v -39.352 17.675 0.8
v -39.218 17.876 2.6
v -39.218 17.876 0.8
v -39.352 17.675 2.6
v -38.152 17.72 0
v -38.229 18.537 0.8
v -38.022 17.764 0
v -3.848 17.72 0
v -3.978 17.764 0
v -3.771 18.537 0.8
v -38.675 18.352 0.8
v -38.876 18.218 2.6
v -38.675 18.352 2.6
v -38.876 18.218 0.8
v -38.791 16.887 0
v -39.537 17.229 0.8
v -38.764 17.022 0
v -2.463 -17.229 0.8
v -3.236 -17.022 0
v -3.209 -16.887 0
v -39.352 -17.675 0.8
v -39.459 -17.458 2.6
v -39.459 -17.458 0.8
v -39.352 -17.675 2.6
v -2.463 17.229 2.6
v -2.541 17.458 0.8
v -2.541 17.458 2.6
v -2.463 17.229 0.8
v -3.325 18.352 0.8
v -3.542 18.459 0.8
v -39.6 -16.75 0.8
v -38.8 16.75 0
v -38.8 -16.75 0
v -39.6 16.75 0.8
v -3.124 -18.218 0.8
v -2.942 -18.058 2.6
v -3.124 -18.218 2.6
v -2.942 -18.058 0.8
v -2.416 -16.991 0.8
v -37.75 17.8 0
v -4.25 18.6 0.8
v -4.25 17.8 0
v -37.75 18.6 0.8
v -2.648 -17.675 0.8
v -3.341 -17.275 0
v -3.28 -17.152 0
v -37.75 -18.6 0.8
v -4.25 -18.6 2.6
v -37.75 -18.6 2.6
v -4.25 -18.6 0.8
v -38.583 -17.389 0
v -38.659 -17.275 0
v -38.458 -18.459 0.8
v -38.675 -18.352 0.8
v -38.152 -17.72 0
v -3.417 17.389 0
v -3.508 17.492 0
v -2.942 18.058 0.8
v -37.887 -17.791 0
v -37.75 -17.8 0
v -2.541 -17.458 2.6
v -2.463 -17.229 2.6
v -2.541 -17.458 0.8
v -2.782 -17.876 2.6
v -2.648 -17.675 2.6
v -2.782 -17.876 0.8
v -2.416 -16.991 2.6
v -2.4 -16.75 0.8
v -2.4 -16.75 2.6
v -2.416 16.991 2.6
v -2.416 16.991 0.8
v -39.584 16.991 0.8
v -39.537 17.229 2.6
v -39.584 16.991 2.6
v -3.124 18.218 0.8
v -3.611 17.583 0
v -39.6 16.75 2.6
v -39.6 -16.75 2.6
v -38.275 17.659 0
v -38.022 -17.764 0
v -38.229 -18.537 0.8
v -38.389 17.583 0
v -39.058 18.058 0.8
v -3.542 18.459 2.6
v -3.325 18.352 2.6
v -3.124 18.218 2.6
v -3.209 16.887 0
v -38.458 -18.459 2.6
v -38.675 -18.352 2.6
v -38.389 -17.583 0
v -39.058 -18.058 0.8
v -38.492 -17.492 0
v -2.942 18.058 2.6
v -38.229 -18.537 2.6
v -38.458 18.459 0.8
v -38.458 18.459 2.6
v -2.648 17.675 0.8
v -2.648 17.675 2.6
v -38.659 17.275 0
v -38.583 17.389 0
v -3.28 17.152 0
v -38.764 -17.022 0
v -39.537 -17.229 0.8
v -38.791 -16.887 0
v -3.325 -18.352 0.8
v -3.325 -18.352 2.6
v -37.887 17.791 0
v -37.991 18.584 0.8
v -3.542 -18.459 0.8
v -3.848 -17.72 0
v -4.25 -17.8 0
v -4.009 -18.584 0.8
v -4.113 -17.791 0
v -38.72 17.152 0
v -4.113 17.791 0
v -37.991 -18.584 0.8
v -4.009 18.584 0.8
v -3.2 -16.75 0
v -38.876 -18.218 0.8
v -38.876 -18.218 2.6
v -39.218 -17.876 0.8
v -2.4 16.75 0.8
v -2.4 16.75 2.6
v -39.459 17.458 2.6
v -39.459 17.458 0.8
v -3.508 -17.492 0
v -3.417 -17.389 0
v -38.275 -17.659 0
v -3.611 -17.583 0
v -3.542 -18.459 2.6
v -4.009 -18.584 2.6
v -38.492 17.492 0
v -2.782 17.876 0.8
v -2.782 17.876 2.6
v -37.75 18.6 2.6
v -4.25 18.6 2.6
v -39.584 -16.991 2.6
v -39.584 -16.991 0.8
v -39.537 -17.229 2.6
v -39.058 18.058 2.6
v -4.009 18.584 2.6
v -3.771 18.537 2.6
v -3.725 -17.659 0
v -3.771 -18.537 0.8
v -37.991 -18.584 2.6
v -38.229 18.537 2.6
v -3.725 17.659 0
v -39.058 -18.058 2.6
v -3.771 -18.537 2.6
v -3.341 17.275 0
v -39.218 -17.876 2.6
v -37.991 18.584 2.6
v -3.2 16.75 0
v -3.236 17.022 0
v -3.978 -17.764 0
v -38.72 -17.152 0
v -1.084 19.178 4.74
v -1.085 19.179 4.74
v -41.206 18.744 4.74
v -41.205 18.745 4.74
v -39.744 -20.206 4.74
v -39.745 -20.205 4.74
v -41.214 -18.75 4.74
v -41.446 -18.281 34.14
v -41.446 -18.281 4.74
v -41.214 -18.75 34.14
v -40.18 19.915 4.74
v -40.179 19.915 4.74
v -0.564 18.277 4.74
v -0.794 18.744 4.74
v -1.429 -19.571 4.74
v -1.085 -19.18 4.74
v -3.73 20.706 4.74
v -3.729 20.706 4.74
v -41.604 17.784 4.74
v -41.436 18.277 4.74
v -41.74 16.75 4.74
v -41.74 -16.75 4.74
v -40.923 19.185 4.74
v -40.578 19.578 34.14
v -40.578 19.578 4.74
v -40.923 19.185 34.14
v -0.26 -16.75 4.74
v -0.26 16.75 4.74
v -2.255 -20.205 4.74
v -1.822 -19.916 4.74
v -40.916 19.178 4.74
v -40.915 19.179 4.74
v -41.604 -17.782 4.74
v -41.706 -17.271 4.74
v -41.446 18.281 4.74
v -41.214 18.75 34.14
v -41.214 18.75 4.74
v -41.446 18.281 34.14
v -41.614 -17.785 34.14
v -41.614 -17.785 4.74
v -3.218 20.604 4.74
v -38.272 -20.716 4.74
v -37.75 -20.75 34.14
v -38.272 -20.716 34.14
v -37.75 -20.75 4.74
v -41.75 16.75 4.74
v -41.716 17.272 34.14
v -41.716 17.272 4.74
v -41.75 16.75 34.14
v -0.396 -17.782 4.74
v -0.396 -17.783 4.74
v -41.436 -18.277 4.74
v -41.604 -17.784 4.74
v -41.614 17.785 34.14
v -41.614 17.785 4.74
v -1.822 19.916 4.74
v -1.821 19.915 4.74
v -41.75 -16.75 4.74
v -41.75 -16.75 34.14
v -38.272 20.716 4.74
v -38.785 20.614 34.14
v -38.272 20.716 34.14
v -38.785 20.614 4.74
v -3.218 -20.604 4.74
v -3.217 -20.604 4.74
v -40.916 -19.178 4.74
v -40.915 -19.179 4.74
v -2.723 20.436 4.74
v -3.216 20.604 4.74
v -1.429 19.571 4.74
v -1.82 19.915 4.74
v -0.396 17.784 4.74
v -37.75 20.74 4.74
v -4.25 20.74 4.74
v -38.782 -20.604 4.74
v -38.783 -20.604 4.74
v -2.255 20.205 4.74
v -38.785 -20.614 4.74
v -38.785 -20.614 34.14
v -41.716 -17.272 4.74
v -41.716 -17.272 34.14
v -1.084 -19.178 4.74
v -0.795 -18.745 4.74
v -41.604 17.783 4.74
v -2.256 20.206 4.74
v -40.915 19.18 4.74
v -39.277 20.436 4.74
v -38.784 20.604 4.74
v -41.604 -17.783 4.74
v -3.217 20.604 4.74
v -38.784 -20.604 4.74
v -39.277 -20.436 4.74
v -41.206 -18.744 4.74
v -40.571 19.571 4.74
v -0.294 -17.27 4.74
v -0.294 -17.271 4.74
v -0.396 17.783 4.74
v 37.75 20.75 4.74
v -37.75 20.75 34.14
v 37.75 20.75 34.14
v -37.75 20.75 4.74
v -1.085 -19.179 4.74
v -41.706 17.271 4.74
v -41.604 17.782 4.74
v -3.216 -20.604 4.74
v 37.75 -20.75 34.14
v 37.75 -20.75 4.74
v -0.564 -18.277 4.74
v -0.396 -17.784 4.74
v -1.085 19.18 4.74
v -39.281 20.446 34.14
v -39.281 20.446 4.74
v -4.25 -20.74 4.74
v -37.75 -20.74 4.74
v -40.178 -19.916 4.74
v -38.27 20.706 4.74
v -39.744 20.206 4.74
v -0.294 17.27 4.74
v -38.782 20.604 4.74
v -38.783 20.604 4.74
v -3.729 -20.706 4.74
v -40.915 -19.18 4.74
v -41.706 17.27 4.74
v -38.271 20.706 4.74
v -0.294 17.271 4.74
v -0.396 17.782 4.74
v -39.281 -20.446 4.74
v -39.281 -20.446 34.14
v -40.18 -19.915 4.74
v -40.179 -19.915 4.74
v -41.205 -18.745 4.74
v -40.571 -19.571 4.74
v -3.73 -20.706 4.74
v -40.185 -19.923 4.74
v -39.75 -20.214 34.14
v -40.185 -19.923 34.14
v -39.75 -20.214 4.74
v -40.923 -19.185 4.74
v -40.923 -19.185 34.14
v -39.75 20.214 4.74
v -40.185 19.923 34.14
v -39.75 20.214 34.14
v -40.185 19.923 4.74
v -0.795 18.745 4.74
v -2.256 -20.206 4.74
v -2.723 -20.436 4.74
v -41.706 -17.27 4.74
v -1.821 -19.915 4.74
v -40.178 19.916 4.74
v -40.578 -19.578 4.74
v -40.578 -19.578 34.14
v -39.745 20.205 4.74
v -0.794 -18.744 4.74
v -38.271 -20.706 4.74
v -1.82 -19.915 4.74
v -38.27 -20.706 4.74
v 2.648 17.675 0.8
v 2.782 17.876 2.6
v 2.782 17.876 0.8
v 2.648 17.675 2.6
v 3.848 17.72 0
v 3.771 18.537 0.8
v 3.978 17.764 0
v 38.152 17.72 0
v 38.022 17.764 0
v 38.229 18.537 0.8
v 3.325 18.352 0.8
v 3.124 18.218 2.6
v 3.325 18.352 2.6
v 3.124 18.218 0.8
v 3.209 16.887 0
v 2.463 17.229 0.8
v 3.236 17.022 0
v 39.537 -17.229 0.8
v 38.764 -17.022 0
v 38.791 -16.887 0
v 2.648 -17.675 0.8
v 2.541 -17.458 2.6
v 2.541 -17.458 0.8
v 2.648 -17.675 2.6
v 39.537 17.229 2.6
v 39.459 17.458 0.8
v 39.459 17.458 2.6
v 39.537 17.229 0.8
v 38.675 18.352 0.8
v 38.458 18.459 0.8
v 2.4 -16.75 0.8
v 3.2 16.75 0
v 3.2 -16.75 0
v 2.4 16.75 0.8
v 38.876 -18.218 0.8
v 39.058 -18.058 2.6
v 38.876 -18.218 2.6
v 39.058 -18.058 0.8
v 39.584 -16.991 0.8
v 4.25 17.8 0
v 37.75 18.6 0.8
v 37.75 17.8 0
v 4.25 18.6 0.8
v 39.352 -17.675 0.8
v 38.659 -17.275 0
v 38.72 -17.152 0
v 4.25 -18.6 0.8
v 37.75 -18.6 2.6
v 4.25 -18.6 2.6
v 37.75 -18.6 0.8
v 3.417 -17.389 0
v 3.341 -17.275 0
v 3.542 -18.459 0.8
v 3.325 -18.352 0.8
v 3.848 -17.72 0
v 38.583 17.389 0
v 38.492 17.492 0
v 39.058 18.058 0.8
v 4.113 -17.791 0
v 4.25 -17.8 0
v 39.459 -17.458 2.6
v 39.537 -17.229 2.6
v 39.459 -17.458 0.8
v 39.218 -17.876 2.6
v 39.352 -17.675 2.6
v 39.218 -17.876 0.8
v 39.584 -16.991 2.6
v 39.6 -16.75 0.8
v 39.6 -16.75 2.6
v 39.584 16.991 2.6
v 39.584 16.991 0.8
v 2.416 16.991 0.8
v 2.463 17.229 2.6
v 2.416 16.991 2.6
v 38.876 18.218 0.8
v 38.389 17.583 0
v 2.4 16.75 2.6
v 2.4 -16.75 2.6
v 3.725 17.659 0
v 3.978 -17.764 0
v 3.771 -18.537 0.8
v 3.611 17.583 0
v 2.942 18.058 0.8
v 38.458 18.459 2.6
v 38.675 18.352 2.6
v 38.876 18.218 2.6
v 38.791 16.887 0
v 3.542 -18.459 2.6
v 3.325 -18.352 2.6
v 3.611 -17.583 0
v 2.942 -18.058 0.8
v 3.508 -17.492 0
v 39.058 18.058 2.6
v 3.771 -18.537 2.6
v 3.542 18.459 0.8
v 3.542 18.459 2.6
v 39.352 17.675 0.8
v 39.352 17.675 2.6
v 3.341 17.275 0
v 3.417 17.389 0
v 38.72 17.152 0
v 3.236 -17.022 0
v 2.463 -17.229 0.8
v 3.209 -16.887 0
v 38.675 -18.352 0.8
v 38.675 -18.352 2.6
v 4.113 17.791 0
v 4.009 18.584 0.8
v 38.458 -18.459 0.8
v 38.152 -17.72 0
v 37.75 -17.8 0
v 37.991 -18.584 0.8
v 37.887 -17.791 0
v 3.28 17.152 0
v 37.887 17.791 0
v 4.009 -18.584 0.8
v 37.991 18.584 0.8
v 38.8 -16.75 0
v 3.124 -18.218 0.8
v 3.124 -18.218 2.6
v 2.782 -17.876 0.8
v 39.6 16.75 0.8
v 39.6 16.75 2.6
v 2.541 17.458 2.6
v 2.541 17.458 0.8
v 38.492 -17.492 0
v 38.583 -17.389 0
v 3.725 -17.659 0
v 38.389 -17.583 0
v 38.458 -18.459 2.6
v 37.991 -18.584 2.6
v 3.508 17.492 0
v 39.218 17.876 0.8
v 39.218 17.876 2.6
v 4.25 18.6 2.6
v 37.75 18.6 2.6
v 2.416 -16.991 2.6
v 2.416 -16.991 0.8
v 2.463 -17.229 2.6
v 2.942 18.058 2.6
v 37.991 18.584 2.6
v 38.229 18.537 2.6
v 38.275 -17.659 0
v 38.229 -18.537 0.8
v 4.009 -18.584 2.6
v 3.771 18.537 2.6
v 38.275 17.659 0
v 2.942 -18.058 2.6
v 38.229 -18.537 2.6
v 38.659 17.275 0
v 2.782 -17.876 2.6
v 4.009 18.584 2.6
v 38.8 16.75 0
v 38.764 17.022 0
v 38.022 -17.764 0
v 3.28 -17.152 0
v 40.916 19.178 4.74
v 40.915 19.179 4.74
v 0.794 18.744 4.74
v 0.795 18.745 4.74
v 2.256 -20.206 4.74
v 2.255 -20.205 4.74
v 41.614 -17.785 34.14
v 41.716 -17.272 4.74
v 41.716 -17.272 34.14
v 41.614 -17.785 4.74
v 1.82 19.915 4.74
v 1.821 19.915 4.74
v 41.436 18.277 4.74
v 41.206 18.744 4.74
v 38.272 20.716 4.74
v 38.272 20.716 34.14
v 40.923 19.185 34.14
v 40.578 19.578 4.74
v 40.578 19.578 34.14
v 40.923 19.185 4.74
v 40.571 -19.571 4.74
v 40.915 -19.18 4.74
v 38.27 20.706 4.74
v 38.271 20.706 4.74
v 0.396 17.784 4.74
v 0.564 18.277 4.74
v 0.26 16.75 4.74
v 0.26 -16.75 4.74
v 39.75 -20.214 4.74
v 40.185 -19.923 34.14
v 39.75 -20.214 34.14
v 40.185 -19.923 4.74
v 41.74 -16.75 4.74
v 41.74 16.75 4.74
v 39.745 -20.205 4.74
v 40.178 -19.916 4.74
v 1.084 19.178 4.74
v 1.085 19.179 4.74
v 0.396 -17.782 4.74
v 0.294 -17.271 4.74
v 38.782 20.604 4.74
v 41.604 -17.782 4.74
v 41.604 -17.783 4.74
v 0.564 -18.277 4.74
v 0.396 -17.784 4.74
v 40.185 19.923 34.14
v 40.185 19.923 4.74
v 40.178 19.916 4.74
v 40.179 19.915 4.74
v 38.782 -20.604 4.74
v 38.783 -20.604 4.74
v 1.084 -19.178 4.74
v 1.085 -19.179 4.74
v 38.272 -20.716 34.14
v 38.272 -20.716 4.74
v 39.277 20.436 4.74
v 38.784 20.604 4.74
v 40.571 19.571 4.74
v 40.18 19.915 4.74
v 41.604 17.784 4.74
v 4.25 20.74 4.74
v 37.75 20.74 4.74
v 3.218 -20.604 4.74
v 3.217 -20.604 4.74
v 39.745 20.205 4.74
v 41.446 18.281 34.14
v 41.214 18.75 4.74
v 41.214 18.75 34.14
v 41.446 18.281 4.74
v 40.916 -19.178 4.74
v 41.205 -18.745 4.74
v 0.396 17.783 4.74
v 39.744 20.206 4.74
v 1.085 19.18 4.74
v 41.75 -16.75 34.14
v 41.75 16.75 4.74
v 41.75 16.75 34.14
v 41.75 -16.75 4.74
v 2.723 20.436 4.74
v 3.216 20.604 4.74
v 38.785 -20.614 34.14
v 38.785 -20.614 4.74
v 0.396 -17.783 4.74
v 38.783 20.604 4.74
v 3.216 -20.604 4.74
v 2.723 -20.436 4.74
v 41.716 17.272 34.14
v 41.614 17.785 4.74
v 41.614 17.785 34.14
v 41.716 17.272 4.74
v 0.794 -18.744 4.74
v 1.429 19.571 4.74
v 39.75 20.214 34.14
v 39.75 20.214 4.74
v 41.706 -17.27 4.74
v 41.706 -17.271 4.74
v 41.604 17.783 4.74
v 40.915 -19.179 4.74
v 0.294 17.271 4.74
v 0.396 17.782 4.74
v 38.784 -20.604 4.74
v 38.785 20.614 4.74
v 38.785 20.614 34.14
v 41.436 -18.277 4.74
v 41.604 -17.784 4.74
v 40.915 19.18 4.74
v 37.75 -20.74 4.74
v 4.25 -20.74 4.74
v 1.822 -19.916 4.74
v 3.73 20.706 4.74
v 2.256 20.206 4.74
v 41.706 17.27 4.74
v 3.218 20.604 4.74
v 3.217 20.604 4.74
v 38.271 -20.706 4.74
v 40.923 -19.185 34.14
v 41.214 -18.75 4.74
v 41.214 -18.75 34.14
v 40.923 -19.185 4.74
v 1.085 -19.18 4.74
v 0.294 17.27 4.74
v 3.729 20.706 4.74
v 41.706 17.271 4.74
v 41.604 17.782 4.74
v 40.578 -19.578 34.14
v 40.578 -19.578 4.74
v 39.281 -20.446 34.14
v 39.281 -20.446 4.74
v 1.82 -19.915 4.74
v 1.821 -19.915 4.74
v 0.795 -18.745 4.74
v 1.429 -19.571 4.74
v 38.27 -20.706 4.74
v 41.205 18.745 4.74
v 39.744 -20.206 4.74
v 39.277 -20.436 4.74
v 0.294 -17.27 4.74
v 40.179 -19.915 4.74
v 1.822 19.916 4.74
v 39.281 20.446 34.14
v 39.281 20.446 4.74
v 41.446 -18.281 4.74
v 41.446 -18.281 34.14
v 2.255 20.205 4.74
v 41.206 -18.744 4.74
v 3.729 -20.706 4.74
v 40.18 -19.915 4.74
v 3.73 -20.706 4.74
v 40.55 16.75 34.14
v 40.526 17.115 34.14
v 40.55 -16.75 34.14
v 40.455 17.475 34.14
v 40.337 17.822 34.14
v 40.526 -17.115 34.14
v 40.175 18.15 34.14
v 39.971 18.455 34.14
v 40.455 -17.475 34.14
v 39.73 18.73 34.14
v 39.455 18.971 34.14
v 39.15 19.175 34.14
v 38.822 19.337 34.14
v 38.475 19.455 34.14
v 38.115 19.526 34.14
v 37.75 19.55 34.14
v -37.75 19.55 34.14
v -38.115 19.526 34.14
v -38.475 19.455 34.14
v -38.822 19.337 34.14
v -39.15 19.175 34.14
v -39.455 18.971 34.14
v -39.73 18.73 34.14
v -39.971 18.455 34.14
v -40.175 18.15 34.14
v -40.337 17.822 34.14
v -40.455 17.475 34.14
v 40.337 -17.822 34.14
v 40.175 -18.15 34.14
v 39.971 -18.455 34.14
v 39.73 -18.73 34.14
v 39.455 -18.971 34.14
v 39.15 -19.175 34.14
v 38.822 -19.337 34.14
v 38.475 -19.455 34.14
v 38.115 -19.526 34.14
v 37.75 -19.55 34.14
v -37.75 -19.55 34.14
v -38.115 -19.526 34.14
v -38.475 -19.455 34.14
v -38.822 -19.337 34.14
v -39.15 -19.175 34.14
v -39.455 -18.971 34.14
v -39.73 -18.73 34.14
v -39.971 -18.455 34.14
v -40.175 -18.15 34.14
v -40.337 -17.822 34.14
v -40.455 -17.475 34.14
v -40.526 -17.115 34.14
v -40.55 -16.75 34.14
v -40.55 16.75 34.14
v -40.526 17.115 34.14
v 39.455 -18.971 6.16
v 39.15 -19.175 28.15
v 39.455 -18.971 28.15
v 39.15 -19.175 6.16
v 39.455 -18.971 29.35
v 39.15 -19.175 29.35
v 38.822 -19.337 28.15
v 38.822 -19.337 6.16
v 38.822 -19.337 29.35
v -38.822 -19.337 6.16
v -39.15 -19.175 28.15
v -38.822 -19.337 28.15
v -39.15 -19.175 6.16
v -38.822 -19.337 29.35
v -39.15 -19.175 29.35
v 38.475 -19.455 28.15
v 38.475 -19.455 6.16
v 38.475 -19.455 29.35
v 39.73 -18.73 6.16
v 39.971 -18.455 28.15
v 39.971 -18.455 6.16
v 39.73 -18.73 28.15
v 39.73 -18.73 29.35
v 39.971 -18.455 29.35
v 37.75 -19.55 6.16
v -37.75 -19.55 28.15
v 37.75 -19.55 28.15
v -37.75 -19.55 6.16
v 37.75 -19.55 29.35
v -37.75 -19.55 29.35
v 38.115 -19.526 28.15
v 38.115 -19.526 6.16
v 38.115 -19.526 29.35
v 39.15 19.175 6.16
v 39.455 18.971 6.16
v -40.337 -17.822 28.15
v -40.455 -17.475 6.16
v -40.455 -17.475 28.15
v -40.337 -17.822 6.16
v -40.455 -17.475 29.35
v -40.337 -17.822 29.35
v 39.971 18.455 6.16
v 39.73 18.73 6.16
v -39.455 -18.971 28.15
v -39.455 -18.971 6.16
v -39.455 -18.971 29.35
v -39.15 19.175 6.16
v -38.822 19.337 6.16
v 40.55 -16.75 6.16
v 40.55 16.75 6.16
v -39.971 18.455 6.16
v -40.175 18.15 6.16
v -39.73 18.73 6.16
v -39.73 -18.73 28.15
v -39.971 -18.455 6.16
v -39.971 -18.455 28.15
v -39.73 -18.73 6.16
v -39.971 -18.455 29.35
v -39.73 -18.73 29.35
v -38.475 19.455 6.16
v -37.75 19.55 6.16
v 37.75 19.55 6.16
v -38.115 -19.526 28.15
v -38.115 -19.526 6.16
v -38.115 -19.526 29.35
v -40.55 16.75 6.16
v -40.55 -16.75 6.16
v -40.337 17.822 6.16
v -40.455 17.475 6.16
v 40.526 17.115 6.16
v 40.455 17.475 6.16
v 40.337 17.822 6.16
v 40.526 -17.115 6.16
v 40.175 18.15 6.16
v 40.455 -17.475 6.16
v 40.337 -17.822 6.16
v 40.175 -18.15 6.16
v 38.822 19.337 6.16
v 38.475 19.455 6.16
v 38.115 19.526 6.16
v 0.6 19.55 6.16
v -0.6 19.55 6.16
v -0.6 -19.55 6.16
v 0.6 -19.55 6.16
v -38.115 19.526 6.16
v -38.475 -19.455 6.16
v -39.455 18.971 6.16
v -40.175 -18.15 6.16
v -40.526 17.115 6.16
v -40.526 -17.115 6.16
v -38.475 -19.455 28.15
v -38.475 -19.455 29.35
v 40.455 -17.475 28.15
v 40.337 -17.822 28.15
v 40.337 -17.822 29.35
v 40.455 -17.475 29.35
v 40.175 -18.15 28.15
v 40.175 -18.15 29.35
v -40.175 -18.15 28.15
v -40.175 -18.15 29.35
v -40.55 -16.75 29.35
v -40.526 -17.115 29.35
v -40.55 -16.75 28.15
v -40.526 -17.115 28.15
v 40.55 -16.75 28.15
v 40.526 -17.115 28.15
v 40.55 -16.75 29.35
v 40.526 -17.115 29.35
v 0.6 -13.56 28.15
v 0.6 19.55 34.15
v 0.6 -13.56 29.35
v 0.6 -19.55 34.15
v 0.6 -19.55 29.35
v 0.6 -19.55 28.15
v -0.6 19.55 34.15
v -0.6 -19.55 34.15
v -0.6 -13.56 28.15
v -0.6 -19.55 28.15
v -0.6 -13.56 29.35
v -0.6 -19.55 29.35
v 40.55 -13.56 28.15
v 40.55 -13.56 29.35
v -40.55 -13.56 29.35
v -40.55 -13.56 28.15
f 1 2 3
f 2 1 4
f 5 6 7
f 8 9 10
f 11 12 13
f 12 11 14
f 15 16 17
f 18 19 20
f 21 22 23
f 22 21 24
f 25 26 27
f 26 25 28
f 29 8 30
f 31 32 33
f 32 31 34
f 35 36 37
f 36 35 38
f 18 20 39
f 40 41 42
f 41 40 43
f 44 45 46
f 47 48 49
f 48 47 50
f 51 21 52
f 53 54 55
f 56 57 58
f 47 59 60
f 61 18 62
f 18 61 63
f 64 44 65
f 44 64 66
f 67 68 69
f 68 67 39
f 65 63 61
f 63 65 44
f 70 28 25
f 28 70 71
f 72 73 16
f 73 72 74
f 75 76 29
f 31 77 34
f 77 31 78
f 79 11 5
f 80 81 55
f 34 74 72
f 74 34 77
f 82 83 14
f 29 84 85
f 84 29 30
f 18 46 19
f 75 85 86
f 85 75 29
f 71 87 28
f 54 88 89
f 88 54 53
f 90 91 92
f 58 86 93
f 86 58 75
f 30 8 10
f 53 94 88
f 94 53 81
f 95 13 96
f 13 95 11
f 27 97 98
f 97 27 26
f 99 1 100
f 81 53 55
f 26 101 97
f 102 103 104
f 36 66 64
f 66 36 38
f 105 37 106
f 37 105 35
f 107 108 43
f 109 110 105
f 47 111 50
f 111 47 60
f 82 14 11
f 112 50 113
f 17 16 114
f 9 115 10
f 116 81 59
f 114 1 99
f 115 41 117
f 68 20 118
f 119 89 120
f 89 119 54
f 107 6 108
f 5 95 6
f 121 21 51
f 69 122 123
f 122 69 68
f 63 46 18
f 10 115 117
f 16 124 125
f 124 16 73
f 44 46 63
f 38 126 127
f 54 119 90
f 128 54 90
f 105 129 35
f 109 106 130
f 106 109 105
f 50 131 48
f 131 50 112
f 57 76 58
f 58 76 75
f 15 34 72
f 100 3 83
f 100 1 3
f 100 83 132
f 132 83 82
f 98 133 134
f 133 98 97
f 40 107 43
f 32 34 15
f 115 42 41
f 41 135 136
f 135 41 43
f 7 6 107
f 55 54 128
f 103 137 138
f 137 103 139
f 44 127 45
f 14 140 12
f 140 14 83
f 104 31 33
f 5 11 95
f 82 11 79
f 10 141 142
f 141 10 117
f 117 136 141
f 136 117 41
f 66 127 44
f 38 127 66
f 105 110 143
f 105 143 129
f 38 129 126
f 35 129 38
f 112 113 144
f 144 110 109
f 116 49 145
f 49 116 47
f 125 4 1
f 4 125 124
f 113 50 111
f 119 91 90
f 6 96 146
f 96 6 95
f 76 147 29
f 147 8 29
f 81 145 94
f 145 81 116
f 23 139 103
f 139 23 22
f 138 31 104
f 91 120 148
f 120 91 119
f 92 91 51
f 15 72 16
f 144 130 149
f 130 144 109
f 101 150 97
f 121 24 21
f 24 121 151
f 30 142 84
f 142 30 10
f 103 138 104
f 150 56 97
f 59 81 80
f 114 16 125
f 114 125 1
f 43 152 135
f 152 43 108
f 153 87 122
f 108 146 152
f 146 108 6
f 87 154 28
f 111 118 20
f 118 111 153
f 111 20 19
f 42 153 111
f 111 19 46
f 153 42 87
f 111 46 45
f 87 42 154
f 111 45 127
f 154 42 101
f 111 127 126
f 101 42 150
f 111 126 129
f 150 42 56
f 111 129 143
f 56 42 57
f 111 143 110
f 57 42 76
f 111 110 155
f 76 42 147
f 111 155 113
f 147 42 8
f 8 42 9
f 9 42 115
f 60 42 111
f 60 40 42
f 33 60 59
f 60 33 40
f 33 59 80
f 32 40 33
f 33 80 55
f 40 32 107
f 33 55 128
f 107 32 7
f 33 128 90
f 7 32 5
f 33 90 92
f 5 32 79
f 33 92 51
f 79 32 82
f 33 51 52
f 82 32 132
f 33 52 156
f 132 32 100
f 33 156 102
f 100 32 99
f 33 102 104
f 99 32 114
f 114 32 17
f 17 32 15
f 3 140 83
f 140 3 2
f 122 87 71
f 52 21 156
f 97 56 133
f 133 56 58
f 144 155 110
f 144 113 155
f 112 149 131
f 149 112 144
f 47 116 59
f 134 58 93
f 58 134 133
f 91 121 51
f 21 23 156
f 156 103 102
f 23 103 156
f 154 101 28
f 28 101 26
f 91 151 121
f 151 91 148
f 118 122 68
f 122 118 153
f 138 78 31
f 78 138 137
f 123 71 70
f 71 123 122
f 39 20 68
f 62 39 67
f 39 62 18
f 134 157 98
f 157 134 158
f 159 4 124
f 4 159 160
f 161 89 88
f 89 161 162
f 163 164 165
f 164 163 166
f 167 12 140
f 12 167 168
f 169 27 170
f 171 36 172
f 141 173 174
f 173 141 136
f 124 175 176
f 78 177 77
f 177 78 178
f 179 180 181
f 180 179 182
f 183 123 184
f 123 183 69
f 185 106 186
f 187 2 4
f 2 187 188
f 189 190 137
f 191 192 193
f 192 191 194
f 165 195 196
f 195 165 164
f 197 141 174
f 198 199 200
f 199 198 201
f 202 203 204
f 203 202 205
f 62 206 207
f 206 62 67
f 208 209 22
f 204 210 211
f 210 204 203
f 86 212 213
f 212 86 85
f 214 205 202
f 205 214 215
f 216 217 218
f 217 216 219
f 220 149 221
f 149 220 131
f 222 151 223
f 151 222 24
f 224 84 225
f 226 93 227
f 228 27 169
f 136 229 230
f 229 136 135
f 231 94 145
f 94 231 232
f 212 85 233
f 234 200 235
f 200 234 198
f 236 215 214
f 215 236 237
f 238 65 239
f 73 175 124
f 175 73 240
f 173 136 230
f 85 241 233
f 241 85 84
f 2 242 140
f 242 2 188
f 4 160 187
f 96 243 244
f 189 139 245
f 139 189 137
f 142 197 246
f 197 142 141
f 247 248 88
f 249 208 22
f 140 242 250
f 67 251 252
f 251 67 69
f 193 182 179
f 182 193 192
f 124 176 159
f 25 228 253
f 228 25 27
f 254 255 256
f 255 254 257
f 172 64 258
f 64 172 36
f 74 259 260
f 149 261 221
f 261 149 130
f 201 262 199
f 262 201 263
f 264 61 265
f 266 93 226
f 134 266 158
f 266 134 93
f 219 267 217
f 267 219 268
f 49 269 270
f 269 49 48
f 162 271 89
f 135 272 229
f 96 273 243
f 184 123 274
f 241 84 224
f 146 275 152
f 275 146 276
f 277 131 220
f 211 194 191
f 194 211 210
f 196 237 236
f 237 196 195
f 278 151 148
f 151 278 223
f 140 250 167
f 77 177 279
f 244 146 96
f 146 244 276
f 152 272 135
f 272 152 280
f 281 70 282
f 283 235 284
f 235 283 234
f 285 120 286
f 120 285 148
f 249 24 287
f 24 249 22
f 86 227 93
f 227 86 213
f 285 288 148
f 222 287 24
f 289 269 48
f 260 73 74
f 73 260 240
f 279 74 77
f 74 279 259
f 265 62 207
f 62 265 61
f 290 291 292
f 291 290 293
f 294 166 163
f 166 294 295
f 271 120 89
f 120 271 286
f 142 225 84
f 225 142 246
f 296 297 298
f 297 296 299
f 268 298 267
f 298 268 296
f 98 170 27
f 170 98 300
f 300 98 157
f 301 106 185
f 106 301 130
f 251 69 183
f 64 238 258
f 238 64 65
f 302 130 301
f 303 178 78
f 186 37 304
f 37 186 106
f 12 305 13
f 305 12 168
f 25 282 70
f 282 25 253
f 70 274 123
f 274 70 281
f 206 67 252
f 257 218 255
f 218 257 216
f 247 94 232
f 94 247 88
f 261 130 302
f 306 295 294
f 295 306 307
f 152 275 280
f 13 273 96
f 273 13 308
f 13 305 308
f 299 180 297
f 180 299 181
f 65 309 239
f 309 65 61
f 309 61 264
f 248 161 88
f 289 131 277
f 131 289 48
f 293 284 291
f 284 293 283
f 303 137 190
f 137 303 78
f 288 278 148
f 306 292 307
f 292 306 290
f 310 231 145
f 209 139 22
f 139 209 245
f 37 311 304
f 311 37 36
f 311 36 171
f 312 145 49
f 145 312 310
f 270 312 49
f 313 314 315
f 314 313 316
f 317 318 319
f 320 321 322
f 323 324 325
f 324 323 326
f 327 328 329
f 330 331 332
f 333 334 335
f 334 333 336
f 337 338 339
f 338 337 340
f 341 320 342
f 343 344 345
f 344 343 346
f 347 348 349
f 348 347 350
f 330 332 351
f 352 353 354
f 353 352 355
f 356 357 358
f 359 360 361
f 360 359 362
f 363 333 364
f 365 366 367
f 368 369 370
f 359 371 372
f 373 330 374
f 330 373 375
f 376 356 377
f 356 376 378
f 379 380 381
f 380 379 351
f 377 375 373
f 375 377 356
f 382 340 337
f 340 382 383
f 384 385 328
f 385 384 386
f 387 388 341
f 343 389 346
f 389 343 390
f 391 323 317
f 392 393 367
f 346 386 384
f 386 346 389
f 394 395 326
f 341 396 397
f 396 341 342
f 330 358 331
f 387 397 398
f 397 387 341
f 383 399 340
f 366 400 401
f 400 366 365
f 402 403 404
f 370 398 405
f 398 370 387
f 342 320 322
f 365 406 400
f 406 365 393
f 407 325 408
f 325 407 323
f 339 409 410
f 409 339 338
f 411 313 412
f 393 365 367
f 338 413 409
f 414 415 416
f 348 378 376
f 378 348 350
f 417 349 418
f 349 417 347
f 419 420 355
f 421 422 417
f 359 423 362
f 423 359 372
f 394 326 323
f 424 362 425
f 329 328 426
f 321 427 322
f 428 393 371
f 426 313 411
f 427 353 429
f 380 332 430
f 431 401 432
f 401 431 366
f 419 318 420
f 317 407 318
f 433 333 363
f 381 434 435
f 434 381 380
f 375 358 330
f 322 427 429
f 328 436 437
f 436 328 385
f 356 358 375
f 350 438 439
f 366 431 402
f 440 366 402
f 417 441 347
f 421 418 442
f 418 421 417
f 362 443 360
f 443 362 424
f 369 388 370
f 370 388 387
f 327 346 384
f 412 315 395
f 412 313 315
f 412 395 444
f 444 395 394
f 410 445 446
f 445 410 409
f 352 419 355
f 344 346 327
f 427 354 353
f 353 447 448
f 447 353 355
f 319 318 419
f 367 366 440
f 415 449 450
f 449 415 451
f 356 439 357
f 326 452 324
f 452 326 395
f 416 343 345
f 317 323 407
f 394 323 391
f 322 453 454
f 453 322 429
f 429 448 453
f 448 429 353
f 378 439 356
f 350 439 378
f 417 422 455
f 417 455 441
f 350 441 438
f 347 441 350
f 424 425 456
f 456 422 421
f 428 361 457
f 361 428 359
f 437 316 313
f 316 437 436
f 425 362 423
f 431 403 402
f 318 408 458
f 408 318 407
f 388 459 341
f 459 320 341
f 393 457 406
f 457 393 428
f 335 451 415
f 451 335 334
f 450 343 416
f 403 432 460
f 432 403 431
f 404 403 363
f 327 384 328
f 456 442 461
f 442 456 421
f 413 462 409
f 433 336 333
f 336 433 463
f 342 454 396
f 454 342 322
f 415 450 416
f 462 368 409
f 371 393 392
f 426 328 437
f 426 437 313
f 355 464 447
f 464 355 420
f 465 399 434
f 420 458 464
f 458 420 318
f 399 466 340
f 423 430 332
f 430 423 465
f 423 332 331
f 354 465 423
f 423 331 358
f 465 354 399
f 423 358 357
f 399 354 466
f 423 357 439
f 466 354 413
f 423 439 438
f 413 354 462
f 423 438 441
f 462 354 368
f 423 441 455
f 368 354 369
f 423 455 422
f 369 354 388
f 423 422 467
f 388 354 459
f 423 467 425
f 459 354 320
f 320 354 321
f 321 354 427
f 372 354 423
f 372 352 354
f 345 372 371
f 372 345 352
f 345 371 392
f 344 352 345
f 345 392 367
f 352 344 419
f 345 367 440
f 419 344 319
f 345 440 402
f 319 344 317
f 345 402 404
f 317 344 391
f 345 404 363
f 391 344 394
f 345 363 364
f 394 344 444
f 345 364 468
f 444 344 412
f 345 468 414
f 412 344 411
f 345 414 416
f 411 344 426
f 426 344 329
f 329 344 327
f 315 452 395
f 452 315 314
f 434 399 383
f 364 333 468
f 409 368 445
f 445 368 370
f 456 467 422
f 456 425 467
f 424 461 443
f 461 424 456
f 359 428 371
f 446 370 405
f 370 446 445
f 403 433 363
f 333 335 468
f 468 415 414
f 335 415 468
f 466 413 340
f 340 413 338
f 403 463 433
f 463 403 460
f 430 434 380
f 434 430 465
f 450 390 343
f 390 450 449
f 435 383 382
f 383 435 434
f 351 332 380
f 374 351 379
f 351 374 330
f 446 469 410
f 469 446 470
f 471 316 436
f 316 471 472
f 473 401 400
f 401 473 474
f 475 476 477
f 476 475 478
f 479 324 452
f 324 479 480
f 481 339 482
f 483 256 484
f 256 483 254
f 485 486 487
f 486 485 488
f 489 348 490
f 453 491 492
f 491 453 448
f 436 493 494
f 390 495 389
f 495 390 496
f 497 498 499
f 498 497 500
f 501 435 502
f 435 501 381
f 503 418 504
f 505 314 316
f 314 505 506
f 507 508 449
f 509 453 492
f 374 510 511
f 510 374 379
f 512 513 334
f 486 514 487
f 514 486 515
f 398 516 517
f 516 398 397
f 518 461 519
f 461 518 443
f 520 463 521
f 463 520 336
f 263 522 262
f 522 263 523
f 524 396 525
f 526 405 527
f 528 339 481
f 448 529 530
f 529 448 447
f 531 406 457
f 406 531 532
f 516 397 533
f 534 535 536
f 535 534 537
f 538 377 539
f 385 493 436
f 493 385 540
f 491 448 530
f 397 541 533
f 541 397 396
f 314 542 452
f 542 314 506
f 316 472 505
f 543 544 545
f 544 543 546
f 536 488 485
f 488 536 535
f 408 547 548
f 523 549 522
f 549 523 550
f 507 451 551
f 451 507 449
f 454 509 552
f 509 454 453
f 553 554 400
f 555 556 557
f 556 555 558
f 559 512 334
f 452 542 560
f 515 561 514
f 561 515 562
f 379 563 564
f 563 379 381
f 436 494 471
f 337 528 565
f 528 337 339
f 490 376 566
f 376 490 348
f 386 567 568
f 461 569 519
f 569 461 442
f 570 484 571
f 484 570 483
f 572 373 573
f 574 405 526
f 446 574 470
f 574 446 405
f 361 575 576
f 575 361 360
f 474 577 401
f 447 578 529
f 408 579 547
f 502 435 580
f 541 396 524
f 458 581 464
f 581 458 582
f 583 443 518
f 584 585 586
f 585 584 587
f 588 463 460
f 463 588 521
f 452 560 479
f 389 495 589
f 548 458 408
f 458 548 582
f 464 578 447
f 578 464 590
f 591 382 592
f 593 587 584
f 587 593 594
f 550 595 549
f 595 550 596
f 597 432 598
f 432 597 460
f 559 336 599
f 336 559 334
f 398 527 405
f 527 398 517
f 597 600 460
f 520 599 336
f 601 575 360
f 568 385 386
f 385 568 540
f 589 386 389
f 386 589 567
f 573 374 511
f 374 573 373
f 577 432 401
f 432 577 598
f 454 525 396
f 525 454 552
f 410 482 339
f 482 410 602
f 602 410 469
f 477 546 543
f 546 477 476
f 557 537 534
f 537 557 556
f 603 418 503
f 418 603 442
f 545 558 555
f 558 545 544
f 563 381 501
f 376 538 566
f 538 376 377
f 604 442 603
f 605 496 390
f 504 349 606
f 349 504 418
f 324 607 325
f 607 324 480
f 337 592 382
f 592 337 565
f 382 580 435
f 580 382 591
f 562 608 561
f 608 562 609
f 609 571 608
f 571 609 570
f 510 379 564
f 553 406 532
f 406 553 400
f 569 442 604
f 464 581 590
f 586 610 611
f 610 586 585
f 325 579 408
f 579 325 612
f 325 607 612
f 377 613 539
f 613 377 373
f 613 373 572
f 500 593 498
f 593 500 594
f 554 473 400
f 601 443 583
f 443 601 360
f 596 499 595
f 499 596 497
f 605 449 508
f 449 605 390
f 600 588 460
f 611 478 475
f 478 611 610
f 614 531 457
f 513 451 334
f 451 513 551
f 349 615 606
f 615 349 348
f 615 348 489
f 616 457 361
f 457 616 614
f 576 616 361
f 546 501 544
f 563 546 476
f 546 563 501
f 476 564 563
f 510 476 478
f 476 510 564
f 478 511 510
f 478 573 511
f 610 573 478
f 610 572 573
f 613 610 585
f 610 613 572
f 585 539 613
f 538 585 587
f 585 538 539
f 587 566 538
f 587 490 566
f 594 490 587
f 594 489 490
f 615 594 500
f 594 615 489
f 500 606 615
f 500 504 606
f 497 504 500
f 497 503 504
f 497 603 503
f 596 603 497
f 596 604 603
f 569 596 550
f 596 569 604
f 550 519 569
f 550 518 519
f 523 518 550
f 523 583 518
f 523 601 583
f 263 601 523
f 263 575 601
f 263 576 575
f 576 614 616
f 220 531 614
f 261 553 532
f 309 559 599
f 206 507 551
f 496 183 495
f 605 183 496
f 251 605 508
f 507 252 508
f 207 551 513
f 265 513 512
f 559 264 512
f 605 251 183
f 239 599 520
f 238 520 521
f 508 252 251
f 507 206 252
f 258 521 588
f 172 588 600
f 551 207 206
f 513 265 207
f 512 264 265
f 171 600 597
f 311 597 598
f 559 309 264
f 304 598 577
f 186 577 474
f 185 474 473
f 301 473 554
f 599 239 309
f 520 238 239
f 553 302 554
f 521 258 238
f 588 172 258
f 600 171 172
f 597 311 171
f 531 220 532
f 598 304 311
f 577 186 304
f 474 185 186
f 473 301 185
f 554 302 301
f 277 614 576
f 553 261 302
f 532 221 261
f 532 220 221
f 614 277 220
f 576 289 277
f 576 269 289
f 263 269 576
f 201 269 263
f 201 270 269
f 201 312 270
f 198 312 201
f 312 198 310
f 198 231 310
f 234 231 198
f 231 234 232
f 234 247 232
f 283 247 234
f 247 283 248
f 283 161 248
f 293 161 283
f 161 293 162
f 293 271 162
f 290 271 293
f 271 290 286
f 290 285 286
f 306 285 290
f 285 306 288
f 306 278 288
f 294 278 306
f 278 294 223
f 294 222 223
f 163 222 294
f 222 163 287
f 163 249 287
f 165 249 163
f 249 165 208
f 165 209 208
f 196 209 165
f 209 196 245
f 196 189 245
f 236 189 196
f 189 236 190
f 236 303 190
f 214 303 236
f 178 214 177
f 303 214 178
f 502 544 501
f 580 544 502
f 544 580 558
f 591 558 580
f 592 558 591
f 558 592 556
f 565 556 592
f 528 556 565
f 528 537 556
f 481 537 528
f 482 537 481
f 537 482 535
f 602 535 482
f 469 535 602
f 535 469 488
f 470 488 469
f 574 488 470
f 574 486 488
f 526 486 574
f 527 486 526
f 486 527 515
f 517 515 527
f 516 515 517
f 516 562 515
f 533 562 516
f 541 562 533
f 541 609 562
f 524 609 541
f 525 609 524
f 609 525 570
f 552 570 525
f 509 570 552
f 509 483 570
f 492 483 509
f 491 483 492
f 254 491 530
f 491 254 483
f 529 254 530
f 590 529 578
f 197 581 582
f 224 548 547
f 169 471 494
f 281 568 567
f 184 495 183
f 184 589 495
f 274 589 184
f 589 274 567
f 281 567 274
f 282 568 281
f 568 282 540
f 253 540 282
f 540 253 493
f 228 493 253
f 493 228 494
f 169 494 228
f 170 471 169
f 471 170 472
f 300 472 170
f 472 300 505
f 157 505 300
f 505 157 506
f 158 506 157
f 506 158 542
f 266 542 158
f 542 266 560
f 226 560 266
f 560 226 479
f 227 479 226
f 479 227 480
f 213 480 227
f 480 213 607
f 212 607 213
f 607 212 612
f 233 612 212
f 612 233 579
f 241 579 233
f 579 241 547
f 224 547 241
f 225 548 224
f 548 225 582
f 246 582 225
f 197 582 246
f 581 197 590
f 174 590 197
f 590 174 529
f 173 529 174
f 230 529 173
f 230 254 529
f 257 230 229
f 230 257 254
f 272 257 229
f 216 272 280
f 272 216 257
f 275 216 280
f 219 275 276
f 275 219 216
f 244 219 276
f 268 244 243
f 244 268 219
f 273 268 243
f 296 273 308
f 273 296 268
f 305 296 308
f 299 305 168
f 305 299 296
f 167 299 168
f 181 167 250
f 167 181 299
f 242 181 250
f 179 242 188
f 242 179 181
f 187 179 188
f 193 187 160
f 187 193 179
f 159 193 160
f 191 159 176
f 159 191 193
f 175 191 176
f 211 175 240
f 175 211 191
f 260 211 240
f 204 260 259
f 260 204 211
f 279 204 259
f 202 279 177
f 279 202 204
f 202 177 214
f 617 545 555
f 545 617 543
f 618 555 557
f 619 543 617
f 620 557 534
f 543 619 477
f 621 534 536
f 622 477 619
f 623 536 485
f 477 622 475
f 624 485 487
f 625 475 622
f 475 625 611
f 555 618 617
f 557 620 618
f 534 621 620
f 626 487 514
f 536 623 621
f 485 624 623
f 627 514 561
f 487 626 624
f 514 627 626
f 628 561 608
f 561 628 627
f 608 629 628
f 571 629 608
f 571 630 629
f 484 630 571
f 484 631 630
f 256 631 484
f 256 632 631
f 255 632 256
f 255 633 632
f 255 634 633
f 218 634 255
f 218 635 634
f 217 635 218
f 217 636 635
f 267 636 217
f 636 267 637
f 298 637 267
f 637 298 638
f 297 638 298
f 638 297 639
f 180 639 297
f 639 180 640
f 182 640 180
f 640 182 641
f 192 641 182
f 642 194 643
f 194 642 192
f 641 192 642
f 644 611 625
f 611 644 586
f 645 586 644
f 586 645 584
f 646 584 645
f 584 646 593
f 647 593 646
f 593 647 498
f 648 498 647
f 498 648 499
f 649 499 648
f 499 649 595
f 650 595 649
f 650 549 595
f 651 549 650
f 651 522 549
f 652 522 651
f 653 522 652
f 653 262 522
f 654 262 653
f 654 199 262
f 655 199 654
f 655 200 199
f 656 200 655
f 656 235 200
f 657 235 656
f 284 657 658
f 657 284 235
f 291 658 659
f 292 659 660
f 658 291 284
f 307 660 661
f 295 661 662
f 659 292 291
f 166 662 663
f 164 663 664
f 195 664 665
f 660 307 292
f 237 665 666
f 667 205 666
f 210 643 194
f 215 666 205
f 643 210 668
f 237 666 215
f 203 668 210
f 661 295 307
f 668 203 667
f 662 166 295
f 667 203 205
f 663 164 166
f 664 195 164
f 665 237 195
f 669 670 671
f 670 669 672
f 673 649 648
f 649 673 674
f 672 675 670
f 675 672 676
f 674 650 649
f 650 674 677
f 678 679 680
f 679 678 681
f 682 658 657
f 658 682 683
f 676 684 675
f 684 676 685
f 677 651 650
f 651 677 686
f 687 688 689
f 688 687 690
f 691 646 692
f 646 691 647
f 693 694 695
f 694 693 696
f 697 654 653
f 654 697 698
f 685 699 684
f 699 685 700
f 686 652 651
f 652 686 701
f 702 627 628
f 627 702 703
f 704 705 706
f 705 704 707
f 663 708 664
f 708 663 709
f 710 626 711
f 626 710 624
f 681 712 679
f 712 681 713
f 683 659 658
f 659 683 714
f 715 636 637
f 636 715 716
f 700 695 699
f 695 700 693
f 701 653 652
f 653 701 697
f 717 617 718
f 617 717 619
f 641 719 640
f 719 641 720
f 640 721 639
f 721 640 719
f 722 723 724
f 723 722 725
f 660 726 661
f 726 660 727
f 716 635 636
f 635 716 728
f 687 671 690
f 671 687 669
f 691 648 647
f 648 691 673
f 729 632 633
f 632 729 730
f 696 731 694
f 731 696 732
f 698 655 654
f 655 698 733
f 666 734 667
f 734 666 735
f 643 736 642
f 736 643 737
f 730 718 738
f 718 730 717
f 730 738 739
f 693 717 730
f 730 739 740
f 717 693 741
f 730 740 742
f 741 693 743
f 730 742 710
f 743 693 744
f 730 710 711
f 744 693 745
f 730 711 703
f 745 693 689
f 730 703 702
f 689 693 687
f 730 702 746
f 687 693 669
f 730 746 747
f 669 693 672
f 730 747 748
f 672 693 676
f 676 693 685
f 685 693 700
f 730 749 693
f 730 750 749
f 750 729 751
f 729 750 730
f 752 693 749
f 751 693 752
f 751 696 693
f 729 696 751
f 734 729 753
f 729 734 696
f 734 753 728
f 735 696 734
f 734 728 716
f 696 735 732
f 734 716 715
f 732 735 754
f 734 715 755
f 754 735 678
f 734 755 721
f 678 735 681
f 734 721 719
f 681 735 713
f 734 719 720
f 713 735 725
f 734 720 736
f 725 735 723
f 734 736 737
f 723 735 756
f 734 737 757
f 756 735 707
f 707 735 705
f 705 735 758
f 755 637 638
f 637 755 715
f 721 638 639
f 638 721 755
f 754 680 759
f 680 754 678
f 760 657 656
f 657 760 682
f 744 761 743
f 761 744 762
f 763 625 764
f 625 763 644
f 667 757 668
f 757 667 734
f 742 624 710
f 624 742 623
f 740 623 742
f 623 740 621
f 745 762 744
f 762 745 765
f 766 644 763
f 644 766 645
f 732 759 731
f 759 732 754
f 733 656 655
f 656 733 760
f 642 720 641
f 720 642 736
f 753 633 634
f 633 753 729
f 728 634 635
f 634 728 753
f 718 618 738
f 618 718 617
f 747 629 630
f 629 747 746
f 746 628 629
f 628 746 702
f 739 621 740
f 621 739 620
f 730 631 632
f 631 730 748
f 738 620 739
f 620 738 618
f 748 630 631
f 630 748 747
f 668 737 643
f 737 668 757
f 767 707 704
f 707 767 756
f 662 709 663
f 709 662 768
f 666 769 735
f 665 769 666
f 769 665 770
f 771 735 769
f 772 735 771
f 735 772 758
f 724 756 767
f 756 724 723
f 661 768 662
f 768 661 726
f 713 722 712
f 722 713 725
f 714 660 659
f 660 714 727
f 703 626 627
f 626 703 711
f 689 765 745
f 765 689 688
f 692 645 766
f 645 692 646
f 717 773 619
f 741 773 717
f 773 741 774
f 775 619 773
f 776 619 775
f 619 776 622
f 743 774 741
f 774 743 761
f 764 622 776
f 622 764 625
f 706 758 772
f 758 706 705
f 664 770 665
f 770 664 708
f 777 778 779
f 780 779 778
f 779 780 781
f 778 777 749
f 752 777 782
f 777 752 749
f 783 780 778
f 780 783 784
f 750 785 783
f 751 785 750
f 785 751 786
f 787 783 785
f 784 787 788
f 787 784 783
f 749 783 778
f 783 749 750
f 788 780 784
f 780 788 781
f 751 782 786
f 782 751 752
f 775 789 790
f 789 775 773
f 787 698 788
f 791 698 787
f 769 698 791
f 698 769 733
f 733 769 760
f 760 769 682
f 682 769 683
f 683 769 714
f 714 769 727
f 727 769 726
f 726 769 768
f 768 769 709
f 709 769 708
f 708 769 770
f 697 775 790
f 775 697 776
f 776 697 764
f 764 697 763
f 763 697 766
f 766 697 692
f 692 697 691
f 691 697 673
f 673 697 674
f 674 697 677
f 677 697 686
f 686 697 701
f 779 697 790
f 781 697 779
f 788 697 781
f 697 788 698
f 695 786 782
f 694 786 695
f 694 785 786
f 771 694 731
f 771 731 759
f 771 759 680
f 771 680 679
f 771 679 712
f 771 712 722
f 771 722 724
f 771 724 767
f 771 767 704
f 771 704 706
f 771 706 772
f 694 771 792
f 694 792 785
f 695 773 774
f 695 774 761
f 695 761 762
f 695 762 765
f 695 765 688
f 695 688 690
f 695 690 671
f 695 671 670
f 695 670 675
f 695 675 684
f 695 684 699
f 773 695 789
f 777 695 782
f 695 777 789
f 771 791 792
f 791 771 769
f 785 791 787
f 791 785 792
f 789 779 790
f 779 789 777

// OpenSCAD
// file: gridfinity.scad
// =====================================================================
//  GRIDFINITY core — spec-exact foot + baseplate (42mm grid)
//  Reusable: `use <gridfinity.scad>` then call gf_base()/gf_baseplate().
//  Profile: 0.8 chamfer / 1.8 straight / 2.15 chamfer = 4.75mm foot.
// =====================================================================

GF      = 42;        // grid pitch
GF_CLR  = 0.5;       // bin footprint = GF*u - GF_CLR  (0.25 per side)
GF_R    = 4;         // outer corner radius
F1 = 0.8; F2 = 1.8; F3 = 2.15;        // chamfer / straight / chamfer
GF_FOOT = F1 + F2 + F3;               // 4.75
$fn = 40;

// rounded square, centered
module gf_rr(w, d, r) offset(r=max(0.4, r)) square([max(0.2, w-2*r), max(0.2, d-2*r)], center=true);

// one 1x1 foot (solid), optional `clr` enlarges it (used to cut baseplate sockets)
module gf_foot_1u(clr=0) {
  w  = GF - GF_CLR + 2*clr;
  wt = w - 2*F3;            // straight-section width
  wb = wt - 2*F1;          // bottom width
  rt = GF_R + clr;
  // bottom chamfer
  hull() {
    linear_extrude(0.01) gf_rr(wb, wb, rt-F3-F1);
    translate([0,0,F1]) linear_extrude(0.01) gf_rr(wt, wt, rt-F3);
  }
  // straight
  translate([0,0,F1]) linear_extrude(F2) gf_rr(wt, wt, rt-F3);
  // top chamfer
  hull() {
    translate([0,0,F1+F2])   linear_extrude(0.01) gf_rr(wt, wt, rt-F3);
    translate([0,0,GF_FOOT]) linear_extrude(0.01) gf_rr(w,  w,  rt);
  }
}

// bin BASE for a ux x uy bin: the feet + the floor plate they join into.
// Build your bin body on top, starting at z = GF_FOOT.
module gf_base(ux, uy, floor=1.2) {
  for (i=[0:ux-1], j=[0:uy-1])
    translate([(i-(ux-1)/2)*GF, (j-(uy-1)/2)*GF, 0]) gf_foot_1u();
  // floor plate joining the feet
  translate([0,0,GF_FOOT-0.01])
    linear_extrude(floor+0.01) gf_rr(ux*GF-GF_CLR, uy*GF-GF_CLR, GF_R);
}

// BASEPLATE of nx x ny cells (sockets the feet drop into). socket_clr = fit gap.
module gf_baseplate(nx, ny, socket_clr=0.25, wall=1.6) {
  H = GF_FOOT + 0.6;
  difference() {
    linear_extrude(H) gf_rr(nx*GF, ny*GF, GF_R);     // full-pitch slab (tiles butt together)
    for (i=[0:nx-1], j=[0:ny-1])
      translate([(i-(nx-1)/2)*GF, (j-(ny-1)/2)*GF, H-GF_FOOT])
        gf_foot_1u(socket_clr);
  }
}
// main file
// =====================================================================
//  GRIDFINITY BIN  — parametric storage bin (drops into any 42mm baseplate)
//  Spec-exact base, configurable size / height / compartments + label ledge.
//  Units: mm.  Export: F6 then File > Export > STL.
// =====================================================================
include <gridfinity.scad>

/* [Size] */
ux = 2;            // grid units wide  (x · 42mm each)
uy = 1;            // grid units deep  (y · 42mm each)
uz = 4;            // height units     (z · 7mm each → 28mm here)

/* [Inside] */
compartments = 2;  // equal x-divisions (1 = single open bin)
wall   = 1.2;      // wall + divider thickness
floorT = 1.4;      // bin floor thickness
label  = true;     // thin write-on label ledge at the top front

$fn = 48;
H        = uz * 7;
base_top = GF_FOOT + floorT;
OW = ux*GF - GF_CLR;
OD = uy*GF - GF_CLR;

echo(str("Gridfinity bin ", ux, "x", uy, "x", uz, "  (", OW, " x ", OD, " x ",
         H + base_top, " mm)  · ", compartments, " compartment(s)"));

// feet + floor
gf_base(ux, uy, floor = floorT);

// outer walls (hollow)
difference() {
  translate([0,0,base_top - 0.01]) linear_extrude(H) gf_rr(OW, OD, GF_R);
  translate([0,0,base_top + 0.01]) linear_extrude(H) gf_rr(OW - 2*wall, OD - 2*wall, max(1, GF_R - wall));
}

// dividers
if (compartments > 1)
  for (i = [1 : compartments-1])
    translate([-OW/2 + i*OW/compartments - wall/2, -(OD - 2*wall)/2, base_top])
      cube([wall, OD - 2*wall, H]);

// label ledge across the top front (write on it or stick a tag)
if (label)
  translate([-(OW - 2*wall)/2, -OD/2 + wall - 0.01, base_top + H - 6])
    cube([OW - 2*wall, 6, 1.2]);
